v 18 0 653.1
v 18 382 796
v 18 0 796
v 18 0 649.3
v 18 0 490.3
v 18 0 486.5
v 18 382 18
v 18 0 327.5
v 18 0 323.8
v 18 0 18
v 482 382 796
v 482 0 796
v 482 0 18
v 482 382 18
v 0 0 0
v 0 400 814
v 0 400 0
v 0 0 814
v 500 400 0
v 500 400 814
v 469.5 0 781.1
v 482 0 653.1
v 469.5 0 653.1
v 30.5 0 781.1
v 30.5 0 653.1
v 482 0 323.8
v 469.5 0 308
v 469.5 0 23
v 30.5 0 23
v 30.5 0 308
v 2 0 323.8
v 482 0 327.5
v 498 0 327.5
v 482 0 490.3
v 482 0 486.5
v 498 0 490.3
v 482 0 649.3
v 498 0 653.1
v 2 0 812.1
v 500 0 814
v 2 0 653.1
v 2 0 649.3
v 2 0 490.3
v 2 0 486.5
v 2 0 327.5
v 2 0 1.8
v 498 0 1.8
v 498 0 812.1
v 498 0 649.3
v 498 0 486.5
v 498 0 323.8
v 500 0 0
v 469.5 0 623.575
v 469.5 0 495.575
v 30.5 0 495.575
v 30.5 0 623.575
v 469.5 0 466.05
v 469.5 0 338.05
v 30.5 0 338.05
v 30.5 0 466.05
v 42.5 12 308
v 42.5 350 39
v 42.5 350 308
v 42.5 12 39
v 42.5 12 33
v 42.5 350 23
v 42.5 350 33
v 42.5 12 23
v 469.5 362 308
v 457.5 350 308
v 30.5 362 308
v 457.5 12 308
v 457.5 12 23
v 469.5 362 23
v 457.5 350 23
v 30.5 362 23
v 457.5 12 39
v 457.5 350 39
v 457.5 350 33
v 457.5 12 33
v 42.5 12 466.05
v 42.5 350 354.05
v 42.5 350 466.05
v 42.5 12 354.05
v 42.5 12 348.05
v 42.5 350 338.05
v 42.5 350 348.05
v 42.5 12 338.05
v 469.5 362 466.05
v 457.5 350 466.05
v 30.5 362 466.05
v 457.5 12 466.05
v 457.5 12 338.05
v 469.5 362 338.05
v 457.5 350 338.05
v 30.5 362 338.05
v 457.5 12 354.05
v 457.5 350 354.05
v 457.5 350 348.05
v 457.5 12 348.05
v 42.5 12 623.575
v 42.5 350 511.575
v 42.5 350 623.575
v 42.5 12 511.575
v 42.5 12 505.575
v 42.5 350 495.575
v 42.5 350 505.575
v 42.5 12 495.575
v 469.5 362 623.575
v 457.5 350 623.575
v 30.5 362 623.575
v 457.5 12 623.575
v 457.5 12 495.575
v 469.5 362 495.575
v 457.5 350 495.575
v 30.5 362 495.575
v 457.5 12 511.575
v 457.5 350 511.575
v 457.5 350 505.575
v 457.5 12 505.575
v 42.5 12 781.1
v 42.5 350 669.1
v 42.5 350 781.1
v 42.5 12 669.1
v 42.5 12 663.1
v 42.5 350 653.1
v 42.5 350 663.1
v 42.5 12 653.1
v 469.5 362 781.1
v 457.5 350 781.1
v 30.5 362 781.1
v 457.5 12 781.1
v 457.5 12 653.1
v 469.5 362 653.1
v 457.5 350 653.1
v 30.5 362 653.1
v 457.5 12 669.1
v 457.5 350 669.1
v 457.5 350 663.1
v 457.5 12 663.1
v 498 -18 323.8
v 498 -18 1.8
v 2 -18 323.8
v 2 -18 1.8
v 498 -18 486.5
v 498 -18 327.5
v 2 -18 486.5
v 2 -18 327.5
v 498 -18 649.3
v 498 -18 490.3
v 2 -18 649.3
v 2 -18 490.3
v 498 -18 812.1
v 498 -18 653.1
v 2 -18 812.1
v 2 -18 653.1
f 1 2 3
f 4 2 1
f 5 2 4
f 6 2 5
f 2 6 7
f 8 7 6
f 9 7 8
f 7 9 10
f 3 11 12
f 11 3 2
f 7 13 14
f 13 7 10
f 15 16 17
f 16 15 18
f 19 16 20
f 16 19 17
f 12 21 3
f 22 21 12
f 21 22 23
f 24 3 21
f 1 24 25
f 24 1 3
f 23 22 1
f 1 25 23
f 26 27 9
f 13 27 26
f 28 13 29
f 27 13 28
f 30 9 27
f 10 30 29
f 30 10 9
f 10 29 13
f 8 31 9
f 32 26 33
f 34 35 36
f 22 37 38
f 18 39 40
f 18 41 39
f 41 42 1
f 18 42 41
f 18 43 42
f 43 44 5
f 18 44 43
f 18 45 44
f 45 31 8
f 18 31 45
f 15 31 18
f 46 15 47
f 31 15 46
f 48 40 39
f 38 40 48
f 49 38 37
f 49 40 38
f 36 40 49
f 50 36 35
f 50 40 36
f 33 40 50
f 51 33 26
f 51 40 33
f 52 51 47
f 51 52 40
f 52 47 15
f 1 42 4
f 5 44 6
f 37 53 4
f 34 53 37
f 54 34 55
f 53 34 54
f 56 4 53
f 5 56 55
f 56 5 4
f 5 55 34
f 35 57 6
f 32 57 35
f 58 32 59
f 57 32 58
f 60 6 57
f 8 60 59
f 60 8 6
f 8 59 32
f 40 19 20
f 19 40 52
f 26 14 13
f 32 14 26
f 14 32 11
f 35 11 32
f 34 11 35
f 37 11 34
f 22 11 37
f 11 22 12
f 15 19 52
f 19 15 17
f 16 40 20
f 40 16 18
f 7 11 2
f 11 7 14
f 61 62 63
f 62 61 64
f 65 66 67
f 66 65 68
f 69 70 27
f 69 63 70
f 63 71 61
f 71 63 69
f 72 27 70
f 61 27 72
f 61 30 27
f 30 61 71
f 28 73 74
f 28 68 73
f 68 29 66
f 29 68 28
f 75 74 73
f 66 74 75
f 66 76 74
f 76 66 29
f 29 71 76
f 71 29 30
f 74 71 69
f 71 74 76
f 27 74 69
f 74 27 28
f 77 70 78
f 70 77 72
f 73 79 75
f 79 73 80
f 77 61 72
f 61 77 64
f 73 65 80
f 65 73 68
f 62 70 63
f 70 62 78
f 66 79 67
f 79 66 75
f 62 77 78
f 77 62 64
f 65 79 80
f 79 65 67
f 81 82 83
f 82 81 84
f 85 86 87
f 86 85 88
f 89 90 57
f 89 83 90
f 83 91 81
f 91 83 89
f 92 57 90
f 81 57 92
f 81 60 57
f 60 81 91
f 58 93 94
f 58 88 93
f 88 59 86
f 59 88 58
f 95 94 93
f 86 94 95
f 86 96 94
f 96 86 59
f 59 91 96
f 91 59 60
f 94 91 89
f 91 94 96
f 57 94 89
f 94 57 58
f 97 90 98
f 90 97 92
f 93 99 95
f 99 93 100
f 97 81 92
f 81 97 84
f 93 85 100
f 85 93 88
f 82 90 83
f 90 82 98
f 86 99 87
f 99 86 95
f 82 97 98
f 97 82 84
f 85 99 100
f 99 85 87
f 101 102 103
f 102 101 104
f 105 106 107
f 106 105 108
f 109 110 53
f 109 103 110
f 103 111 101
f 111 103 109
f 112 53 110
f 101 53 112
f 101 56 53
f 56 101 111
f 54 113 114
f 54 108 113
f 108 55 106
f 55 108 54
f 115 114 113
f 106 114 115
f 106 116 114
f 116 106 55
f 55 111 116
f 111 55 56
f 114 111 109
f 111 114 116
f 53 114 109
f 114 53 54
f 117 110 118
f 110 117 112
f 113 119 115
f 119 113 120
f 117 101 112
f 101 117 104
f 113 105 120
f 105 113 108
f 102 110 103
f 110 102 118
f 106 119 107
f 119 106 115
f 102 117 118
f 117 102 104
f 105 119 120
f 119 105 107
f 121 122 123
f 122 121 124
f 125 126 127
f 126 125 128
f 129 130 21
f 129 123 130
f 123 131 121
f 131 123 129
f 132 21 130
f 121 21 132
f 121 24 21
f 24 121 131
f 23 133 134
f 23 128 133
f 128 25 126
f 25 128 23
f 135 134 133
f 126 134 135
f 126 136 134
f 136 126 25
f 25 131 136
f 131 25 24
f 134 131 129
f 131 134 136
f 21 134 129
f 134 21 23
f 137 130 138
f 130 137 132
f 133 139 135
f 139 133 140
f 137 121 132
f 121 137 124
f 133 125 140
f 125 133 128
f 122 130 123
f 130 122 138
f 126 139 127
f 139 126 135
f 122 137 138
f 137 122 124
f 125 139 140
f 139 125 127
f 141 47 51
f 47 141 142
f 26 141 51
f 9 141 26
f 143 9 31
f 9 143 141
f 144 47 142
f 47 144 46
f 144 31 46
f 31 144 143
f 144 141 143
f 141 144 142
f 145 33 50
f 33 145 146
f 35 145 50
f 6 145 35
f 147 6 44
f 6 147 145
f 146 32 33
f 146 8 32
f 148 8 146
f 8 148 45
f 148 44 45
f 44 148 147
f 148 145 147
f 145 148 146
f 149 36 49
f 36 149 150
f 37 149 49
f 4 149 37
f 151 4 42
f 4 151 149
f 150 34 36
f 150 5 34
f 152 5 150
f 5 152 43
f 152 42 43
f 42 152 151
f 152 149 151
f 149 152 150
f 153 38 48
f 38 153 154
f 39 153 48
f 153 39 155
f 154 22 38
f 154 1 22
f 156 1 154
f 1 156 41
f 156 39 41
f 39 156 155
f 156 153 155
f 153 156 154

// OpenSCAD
hasDoor = false;
largeDrawers = 1; //1:3; 2:1
smallDrawers = 3; // 5||3||1
drawerSideClearance = 12.5;
drawerTopClearance = 15;
drawerBottomClearance = 5;
drawerDepthClearance = 20;
drawerThickness = 12;

drawerEnclosed = false;

wheelHeight = 108;

frontClearance = 4;
height = 922;
width = 500;
depth = 400;
thickness = 18;

innerWidth = width - 2 * thickness;

corpusHeight = height - wheelHeight;
corpusInnerHeight = corpusHeight - thickness * 2;
corpusCalculationHeight = drawerEnclosed ? corpusInnerHeight : corpusHeight;

// Einteilung in Rastereinheiten: kleine Schublade = 1 Einheit, grosse = 2 Einheiten.
// Grosse Schubladen sind immer ganz unten.
drawerUnits = smallDrawers + largeDrawers * 2;
drawerCount = smallDrawers + largeDrawers;
assert(drawerCount > 0, "Mindestens eine Schublade nötig");

// Liste aller Schubladen von unten nach oben: [Starteinheit, Grösse in Einheiten]
drawers = concat(
	[for (i = [0:1:largeDrawers - 1]) [i * 2, 2]],
	[for (i = [0:1:smallDrawers - 1]) [largeDrawers * 2 + i, 1]]
);

// Raster der Fronten: aussen über die ganze Korpushöhe, innen nur über den Innenraum
frontPitch = corpusCalculationHeight / drawerUnits;
frontStartZ = drawerEnclosed ? thickness : 0;
// auf ganze mm gerundet; die Differenz wird gleichmässig auf die Fugen verteilt
frontHeightSmall = round(frontPitch - frontClearance);
frontHeightLarge = round(frontPitch * 2 - frontClearance);
frontInsetSmall = (frontPitch - frontHeightSmall) / 2;
frontInsetLarge = (frontPitch * 2 - frontHeightLarge) / 2;

function frontHeight(size) = size == 1 ? frontHeightSmall : frontHeightLarge;
function frontZ(unit, size) = frontStartZ + unit * frontPitch + (size == 1 ? frontInsetSmall : frontInsetLarge);

// Schubladenkästen: eigenes gleichmässiges Raster (drawerPitch pro Einheit).
// - unterster Kasten steht drawerBottomClearance über dem Korpusboden
// - oberster Kasten steht bündig auf der Unterkante seiner Front
//   (oder höher, falls sonst drawerTopClearance zwischen den Kästen fehlen würde)
// - oberster Kasten hält drawerTopClearance zum Korpusdeckel
// - grosser Kasten = kleiner Kasten + eine Rastereinheit
drawerBottomZ = thickness + drawerBottomClearance;
drawerTopLimit = corpusHeight - thickness - drawerTopClearance;
topSize = smallDrawers > 0 ? 1 : 2;
topFrontZ = frontZ(drawerUnits - topSize, topSize);
// Unterkante eines (gedachten) kleinen Kastens in der obersten Einheit
topUnitDrawerZ = drawerCount == 1
	? max(drawerBottomZ, topFrontZ)
	: max(
		((drawerUnits - 1) * (drawerTopLimit + drawerTopClearance) + drawerBottomZ) / drawerUnits,
		(topFrontZ * (drawerUnits - 1) - drawerBottomZ * (topSize - 1)) / (drawerUnits - topSize)
	);
drawerPitch = drawerCount == 1 ? 0 : (topUnitDrawerZ - drawerBottomZ) / (drawerUnits - 1);
// auf ganze mm gerundet (Abstand zum Deckel kann dadurch bis 0.5 mm kleiner werden)
drawerSideHeightSmall = round(drawerTopLimit - topUnitDrawerZ);
drawerSideHeightLarge = round(drawerTopLimit - topUnitDrawerZ + drawerPitch);

function drawerHeight(size) = size == 1 ? drawerSideHeightSmall : drawerSideHeightLarge;
function drawerZ(unit) = drawerBottomZ + unit * drawerPitch;

if (smallDrawers > 0) echo(str("Kastenhöhe klein: ", drawerSideHeightSmall, " / Fronthöhe klein: ", frontHeightSmall));
if (largeDrawers > 0) echo(str("Kastenhöhe gross: ", drawerSideHeightLarge, " / Fronthöhe gross: ", frontHeightLarge));

// Masse der Schubladenkästen (auch für die Stückliste)
drawerDepth = drawerEnclosed ? depth - 2 * thickness - drawerDepthClearance : depth - thickness - drawerDepthClearance;
drawerInnerWidth = innerWidth - drawerThickness * 2 - drawerSideClearance * 2;
// Boden liegt ringsum gleich tief in einer Nut in Seiten, Vorder- und Rückwand
drawerFloorGrooveDepth = 5;
drawerFloorZ = 10;
drawerFloorWidth = drawerInnerWidth + drawerFloorGrooveDepth * 2;
drawerFloorDepth = drawerDepth - drawerThickness * 2 + drawerFloorGrooveDepth * 2;
drawerFloorThickness = 6;

// Korpus-Seitenwände: bei innen liegenden Fronten um die Frontdicke kürzer
corpusWallDepth = drawerEnclosed ? depth - thickness : depth;

material = "Birke Multiplex";
pricePerQM = 19.32;

module corpus() {
	wallTranslateY = drawerEnclosed ? thickness : 0;

	translate([0, wallTranslateY, thickness]) {
		// left wall
		cube([thickness, corpusWallDepth, corpusInnerHeight]);

		// right wall
		translate([innerWidth + thickness, 0, 0])
		cube([thickness, corpusWallDepth, corpusInnerHeight]);
	}

	// bottom
	cube([width, depth, thickness]);

	// top
	translate([0, 0, corpusHeight - thickness])
	cube([width, depth, thickness]);

	// back wall
	translate([thickness, depth - thickness, thickness])
	cube([innerWidth, thickness, corpusHeight - thickness * 2]);
}

// Preis einer Position (Anzahl × Fläche × m²-Preis).
// Alle Teile werden zum Preis des Korpusmaterials gerechnet: dünnere Platten
// für die Schubladen sind günstiger, der Gesamtpreis ist also eher zu hoch.
function partPrice(part) = part[1] * part[2] * part[3] / 1000000 * pricePerQM;
function sumList(v, i = 0) = i < len(v) ? v[i] + sumList(v, i + 1) : 0;

// [Bezeichnung, Anzahl, Breite, Länge, Dicke]; Positionen mit Anzahl 0 werden weggelassen
allParts = [
	["Korpus Seiten", 2, corpusWallDepth, corpusInnerHeight, thickness],
	["Korpus Boden und Deckel", 2, depth, width, thickness],
	["Korpus Rückwand", 1, innerWidth, corpusInnerHeight, thickness],
	["Schubladen Fronten klein", smallDrawers, frontHeightSmall, width - frontClearance, thickness],
	["Schubladen Fronten gross", largeDrawers, frontHeightLarge, width - frontClearance, thickness],
	["Schubladenkasten Seiten klein", smallDrawers * 2, drawerSideHeightSmall, drawerDepth, drawerThickness],
	["Schubladenkasten Seiten gross", largeDrawers * 2, drawerSideHeightLarge, drawerDepth, drawerThickness],
	["Schubladenkasten Vorder- und Rückwand klein", smallDrawers * 2, drawerSideHeightSmall, drawerInnerWidth, drawerThickness],
	["Schubladenkasten Vorder- und Rückwand gross", largeDrawers * 2, drawerSideHeightLarge, drawerInnerWidth, drawerThickness],
	["Schubladenböden", drawerCount, drawerFloorDepth, drawerFloorWidth, drawerFloorThickness],
];
parts = [for (part = allParts) if (part[1] > 0) part];

module partsList() {
	echo("Pos;Bezeichnung;Typ;Anzahl;Breite;Länge;Dicke;Preis");
	for (i = [0:len(parts) - 1]) {
		part = parts[i];
		echo(str(i + 1, ";", part[0], ";", material, ";", part[1], ";", part[2], ";", part[3], ";", part[4], ";", partPrice(part)));
	}
	echo(str(";Total;;;;;;", sumList([for (part = parts) partPrice(part)])));
}

module drawer(drawerHeight) {
	color("darkgreen") {

		// left
		cube([drawerThickness, drawerDepth, drawerHeight]);

		// right
		translate([innerWidth - drawerThickness - drawerSideClearance * 2, 0, 0])
		cube([drawerThickness, drawerDepth, drawerHeight]);

		// front
		translate([drawerThickness, 0, 0])
		cube([drawerInnerWidth, drawerThickness, drawerHeight]);

		// back
		translate([drawerThickness, drawerDepth - drawerThickness, 0])
		cube([drawerInnerWidth, drawerThickness, drawerHeight]);
	}

	// floor
	color("purple") {
		translate([drawerThickness - drawerFloorGrooveDepth, drawerThickness - drawerFloorGrooveDepth, drawerFloorZ])
		cube([drawerFloorWidth, drawerFloorDepth, drawerFloorThickness]);
	}
}

module frontPanel(frontHeight) {
	cube([width - frontClearance, thickness, frontHeight]);
}

corpus();

drawerY = drawerEnclosed ? thickness : 0;

for (d = drawers) {
	unit = d[0];
	size = d[1];
	fz = frontZ(unit, size);
	fh = frontHeight(size);
	dz = drawerZ(unit);
	dh = drawerHeight(size);

	assert(dz >= fz - 0.01, str("Schubladenkasten in Einheit ", unit, " ragt unter seine Front"));
	assert(dz + dh <= fz + fh + 0.01, str("Schubladenkasten in Einheit ", unit, " ragt über seine Front"));

	// Kasten: eigenes Raster, bleibt immer hinter seiner Front
	translate([thickness + drawerSideClearance, drawerY, dz])
	drawer(dh);

	// Front: Raster über corpusCalculationHeight
	translate([frontClearance / 2, drawerY - thickness, fz])
	frontPanel(fh);
}

partsList();
